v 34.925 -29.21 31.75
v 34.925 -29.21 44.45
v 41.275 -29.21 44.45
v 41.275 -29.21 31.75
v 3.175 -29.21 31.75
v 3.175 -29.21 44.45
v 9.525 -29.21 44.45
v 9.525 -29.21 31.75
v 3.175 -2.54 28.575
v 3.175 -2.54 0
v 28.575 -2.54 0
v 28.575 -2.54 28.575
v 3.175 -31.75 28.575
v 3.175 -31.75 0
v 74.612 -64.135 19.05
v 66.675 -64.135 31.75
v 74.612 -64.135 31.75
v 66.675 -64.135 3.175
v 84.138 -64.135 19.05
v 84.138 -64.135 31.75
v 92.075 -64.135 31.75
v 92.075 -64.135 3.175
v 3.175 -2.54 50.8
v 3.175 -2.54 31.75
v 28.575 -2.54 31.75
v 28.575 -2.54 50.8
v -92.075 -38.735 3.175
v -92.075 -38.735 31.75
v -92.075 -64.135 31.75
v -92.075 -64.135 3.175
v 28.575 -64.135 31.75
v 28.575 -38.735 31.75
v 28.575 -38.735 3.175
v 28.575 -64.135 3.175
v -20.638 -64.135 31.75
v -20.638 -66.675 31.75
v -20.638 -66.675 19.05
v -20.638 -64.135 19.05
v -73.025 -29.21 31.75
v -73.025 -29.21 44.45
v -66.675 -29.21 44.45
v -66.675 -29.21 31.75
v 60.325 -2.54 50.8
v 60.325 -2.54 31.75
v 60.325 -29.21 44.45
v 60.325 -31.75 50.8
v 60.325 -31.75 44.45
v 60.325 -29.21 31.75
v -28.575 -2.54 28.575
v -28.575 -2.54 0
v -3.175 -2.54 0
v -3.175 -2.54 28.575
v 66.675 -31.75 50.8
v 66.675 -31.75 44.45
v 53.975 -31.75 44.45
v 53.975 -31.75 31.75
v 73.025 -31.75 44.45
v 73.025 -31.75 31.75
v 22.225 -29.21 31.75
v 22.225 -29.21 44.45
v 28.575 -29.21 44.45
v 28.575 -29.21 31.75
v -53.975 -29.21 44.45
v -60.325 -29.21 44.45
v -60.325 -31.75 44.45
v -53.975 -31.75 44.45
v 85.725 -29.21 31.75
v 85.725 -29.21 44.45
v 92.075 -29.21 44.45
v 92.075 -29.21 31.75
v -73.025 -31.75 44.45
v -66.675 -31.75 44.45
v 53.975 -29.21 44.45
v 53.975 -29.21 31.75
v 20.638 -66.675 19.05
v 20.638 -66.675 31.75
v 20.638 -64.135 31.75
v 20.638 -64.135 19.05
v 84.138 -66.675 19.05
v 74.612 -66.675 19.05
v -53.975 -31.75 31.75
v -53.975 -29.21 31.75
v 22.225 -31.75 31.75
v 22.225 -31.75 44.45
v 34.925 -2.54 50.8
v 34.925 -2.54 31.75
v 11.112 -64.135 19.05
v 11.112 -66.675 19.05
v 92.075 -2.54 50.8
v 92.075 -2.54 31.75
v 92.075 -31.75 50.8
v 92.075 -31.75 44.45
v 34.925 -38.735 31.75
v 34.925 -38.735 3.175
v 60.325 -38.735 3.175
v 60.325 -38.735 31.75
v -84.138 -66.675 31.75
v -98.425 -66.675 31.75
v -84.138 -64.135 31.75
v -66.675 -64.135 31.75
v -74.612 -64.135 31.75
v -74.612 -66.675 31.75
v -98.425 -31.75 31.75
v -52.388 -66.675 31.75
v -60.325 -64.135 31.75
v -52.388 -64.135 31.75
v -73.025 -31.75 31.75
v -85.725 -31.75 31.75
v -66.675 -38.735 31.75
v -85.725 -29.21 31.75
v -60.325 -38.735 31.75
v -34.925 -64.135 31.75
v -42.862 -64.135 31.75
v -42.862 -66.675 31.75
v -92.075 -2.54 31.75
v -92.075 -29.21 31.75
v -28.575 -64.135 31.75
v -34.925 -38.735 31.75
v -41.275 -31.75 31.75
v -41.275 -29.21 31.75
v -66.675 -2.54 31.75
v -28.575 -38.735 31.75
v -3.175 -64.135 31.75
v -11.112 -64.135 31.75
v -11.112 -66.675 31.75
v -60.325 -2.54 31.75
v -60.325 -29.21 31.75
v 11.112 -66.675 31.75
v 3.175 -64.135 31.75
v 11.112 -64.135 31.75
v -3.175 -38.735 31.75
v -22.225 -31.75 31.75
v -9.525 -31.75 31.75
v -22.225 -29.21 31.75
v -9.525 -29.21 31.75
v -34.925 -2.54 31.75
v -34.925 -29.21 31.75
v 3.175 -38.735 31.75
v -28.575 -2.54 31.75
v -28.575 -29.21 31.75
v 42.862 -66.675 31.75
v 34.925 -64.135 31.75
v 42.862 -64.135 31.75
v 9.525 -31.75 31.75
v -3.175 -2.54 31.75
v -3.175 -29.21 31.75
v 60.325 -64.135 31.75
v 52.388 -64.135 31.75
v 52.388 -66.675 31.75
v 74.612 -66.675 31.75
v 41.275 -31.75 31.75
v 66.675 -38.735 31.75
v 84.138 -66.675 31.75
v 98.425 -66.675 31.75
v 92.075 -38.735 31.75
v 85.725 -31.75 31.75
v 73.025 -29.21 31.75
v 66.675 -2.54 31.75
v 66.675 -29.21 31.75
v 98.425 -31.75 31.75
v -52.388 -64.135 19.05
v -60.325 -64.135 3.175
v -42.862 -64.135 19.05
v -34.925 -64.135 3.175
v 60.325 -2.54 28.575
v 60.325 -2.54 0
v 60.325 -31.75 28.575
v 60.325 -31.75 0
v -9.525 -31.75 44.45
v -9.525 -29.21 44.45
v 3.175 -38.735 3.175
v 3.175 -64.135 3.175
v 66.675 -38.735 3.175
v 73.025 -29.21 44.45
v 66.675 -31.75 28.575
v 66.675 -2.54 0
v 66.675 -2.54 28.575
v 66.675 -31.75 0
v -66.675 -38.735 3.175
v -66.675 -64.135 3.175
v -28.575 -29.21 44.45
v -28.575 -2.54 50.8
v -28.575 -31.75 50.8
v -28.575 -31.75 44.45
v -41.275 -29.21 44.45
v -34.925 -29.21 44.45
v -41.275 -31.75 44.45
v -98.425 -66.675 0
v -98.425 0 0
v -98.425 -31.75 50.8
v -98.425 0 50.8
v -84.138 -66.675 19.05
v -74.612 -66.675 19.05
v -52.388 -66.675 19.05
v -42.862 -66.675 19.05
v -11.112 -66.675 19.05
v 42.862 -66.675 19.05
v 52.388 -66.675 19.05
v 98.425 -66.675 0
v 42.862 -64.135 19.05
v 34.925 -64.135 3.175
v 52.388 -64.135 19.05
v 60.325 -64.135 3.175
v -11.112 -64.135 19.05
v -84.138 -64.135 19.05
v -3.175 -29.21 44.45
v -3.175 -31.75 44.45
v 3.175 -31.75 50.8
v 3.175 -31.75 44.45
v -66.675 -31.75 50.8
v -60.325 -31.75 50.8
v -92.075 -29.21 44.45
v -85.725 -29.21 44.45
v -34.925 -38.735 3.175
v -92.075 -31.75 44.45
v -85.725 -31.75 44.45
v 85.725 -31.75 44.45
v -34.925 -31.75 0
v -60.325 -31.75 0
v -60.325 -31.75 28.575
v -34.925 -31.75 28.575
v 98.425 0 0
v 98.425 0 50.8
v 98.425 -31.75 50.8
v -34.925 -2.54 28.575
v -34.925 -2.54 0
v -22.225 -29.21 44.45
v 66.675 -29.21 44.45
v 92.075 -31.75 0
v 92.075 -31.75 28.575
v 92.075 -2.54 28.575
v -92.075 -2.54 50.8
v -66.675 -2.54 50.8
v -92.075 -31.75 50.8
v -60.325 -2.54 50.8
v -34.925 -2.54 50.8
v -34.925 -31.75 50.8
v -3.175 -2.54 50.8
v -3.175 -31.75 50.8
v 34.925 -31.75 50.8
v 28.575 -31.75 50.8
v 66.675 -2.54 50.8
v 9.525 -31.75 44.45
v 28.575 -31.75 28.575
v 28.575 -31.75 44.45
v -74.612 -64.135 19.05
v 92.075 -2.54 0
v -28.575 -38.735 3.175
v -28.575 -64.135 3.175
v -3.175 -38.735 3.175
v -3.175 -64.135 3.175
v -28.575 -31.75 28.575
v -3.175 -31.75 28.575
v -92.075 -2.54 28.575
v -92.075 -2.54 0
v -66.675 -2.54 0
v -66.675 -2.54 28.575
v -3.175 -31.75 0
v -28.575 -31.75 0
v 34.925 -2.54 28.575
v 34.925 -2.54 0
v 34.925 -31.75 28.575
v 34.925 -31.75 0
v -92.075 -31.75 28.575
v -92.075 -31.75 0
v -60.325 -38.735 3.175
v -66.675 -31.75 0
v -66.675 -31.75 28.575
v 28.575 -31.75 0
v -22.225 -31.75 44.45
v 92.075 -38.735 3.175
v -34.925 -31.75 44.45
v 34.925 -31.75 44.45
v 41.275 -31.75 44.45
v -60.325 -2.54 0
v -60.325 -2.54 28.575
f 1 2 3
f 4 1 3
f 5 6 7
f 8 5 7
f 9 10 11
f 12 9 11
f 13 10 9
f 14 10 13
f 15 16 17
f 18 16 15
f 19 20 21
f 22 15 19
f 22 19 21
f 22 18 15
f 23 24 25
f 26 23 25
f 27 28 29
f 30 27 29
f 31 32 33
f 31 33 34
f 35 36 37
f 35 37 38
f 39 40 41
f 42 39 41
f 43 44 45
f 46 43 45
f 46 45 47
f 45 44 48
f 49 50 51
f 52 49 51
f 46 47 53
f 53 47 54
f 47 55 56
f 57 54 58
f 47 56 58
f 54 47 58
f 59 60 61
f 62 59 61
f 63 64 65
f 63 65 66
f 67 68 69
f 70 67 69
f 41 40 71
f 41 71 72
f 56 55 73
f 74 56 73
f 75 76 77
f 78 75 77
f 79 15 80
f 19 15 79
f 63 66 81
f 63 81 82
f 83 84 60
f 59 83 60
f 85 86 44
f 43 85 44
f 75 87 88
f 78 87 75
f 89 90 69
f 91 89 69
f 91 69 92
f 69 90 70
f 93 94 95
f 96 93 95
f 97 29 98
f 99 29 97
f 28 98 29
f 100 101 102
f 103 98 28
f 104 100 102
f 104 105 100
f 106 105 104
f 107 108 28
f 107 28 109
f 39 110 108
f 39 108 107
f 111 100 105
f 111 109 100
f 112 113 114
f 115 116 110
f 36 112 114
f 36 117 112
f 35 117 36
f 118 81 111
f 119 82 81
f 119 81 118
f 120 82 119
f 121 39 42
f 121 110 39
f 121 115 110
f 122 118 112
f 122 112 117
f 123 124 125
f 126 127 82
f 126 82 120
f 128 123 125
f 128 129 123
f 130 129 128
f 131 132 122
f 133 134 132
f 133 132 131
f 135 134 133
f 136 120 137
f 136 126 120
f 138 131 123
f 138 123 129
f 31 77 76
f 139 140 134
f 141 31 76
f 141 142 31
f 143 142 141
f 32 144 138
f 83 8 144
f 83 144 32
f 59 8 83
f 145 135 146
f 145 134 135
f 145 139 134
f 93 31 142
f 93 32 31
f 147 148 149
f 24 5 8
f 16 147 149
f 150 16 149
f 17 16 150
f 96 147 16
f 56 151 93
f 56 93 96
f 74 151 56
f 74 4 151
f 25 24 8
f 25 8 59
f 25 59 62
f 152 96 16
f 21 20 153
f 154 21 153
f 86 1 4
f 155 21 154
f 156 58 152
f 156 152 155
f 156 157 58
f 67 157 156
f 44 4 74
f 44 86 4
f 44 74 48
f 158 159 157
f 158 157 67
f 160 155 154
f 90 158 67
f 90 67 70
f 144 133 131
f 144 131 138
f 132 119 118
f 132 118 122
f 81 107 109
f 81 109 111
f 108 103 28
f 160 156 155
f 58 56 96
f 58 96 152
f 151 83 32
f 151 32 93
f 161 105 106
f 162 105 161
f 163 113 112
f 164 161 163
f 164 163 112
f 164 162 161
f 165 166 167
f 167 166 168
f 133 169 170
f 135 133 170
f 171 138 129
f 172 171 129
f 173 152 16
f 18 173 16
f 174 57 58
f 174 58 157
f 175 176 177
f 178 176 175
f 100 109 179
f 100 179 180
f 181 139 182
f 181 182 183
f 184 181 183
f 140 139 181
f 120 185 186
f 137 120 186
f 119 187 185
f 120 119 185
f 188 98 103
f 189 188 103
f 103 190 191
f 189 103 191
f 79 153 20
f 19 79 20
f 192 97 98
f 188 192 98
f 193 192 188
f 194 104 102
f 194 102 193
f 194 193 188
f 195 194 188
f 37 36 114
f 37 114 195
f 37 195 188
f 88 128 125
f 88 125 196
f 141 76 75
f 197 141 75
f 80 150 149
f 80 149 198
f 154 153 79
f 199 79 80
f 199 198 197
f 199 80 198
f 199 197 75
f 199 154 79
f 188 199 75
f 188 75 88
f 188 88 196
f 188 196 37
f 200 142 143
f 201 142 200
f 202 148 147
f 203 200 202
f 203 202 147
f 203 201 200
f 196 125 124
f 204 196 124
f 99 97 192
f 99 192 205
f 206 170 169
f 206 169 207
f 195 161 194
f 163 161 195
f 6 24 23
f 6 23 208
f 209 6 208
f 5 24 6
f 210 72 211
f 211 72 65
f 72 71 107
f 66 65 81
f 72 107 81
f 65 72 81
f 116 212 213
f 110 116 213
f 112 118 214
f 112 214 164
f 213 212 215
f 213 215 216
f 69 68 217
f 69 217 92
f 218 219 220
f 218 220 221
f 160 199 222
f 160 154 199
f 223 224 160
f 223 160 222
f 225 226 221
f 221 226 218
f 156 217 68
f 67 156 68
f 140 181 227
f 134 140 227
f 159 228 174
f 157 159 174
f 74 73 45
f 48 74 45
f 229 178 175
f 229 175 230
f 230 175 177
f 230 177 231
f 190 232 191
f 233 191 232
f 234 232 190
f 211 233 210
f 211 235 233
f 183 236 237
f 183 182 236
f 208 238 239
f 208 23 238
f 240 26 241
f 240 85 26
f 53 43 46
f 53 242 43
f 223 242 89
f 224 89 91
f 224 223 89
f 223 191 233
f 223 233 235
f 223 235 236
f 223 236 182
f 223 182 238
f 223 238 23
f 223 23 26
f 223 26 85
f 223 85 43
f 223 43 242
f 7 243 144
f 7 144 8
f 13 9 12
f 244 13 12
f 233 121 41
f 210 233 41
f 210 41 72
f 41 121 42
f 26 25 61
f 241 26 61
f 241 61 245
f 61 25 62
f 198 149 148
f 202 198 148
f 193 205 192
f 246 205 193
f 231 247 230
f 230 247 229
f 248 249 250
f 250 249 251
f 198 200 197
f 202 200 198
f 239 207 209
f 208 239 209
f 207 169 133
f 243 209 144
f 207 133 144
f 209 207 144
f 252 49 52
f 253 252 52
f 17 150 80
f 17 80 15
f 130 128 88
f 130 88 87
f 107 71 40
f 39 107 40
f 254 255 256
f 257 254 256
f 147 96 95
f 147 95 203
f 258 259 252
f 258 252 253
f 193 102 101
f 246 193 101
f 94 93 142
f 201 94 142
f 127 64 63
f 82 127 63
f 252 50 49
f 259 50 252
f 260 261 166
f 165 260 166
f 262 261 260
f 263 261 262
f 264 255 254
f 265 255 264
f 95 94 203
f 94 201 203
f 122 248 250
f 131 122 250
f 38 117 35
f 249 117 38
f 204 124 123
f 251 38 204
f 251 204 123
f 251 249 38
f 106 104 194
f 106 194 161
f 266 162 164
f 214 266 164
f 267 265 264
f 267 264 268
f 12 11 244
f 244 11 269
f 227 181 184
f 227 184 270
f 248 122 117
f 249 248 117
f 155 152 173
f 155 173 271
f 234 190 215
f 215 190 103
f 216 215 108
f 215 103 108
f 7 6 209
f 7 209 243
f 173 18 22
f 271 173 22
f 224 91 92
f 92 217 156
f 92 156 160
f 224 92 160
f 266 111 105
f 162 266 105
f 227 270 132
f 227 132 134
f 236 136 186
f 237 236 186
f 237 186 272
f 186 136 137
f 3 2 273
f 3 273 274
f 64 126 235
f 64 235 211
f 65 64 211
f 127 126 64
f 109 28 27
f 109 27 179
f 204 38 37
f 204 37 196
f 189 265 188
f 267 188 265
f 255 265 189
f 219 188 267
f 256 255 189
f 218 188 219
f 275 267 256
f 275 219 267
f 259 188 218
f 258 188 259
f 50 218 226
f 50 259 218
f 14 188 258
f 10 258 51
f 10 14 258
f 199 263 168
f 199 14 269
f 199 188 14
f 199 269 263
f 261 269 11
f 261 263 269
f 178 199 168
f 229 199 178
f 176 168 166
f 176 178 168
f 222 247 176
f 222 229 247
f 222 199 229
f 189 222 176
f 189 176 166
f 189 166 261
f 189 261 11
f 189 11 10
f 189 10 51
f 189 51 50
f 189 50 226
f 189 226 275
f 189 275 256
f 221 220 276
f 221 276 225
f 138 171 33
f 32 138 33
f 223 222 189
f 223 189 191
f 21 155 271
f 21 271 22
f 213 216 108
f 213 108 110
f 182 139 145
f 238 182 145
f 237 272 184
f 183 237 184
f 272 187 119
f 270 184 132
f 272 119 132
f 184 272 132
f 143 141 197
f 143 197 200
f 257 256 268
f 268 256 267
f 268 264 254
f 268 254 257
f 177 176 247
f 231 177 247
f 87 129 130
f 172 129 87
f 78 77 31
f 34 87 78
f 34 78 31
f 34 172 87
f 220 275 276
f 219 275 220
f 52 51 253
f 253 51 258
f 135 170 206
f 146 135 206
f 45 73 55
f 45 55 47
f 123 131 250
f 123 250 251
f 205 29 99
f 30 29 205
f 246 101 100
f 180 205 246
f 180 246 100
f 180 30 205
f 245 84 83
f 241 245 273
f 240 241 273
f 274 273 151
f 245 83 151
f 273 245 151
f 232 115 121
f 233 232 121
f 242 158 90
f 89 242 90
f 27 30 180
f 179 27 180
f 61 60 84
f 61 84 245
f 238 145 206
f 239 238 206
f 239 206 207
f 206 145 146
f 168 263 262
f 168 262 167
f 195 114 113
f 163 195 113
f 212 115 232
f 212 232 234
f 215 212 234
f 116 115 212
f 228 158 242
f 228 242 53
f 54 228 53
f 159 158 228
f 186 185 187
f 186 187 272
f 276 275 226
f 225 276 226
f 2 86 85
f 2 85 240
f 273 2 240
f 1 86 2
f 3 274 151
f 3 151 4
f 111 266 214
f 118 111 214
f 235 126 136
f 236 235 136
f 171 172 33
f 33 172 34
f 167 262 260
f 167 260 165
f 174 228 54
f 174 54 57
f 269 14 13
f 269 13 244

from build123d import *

# Parameters (mm, degrees)
F1_DEPTH  = 98.425
F2_W      = 25.4
F2_H      = 25.4
F2_H_2    = 29.21
F3_DEPTH  = 50.801
F4_W      = 25.4
F4_H      = 29.21
F5_DEPTH  = 3.175
F6_W      = 6.35
F6_H      = 2.54
F7_DEPTH  = 12.7
F8_W      = 9.525
F8_H      = 2.54
F9_DEPTH  = 12.7
F10_W     = 190.5
F10_H     = 27.94
F11_DEPTH = 3.175


with BuildPart() as f1:
    # F0 (on Right) → F1 (new body, symmetric)
    with BuildSketch(Plane.YZ):
        Polygon((-66.675, 0), (0, 0), (0, 50.8), (-31.75, 50.8), (-31.75, 31.75), (-66.675, 31.75), align=None)
    extrude(amount=F1_DEPTH, both=True)

    # F2 (on face) → F3 (cut, through all)
    with BuildSketch(Plane(origin=(0, 0, 0), x_dir=(1, 0, 0), z_dir=(0, 0, -1))):
        with Locations((-15.875, 51.435)):
            Rectangle(F2_W, F2_H)
        with Locations((-15.875, 17.145)):
            Rectangle(F2_W, F2_H_2)
        with Locations((-47.625, 17.145)):
            Rectangle(F2_W, F2_H_2)
        with Locations((-47.625, 51.435)):
            Rectangle(F2_W, F2_H)
        with Locations((-79.375, 17.145)):
            Rectangle(F2_W, F2_H_2)
        with Locations((-79.375, 51.435)):
            Rectangle(F2_W, F2_H)
        with Locations((47.625, 17.145)):
            Rectangle(F2_W, F2_H_2)
        with Locations((15.875, 51.435)):
            Rectangle(F2_W, F2_H)
        with Locations((79.375, 17.145)):
            Rectangle(F2_W, F2_H_2)
        with Locations((47.625, 51.435)):
            Rectangle(F2_W, F2_H)
        with Locations((79.375, 51.435)):
            Rectangle(F2_W, F2_H)
        with Locations((15.875, 17.145)):
            Rectangle(F2_W, F2_H_2)
    extrude(amount=-F3_DEPTH, mode=Mode.SUBTRACT)

    # F4 (on face) → F5 (join)
    with BuildSketch(Plane.XY.offset(31.75)):
        with Locations((15.875, -17.145)):
            Rectangle(F4_W, F4_H)
        with Locations((47.625, -17.145)):
            Rectangle(F4_W, F4_H)
        with Locations((79.375, -17.145)):
            Rectangle(F4_W, F4_H)
        with Locations((-15.875, -17.145)):
            Rectangle(F4_W, F4_H)
        with Locations((-79.375, -17.145)):
            Rectangle(F4_W, F4_H)
        with Locations((-47.625, -17.145)):
            Rectangle(F4_W, F4_H)
    extrude(amount=-F5_DEPTH)

    # F6 (on face) → F7 (join)
    with BuildSketch(Plane.XY.offset(31.75)):
        with Locations((-88.9, -30.48)):
            Rectangle(F6_W, F6_H)
        with Locations((-69.85, -30.48)):
            Rectangle(F6_W, F6_H)
        with Locations((-38.1, -30.48)):
            Rectangle(F6_W, F6_H)
        with Locations((-57.15, -30.48)):
            Rectangle(F6_W, F6_H)
        with Locations((-6.35, -30.48)):
            Rectangle(F6_W, F6_H)
        with Locations((-25.4, -30.48)):
            Rectangle(F6_W, F6_H)
        with Locations((25.4, -30.48)):
            Rectangle(F6_W, F6_H)
        with Locations((6.35, -30.48)):
            Rectangle(F6_W, F6_H)
        with Locations((57.15, -30.48)):
            Rectangle(F6_W, F6_H)
        with Locations((38.1, -30.48)):
            Rectangle(F6_W, F6_H)
        with Locations((88.9, -30.48)):
            Rectangle(F6_W, F6_H)
        with Locations((69.85, -30.48)):
            Rectangle(F6_W, F6_H)
    extrude(amount=F7_DEPTH)

    # F8 (on face) → F9 (cut)
    with BuildSketch(Plane.XY.offset(31.75)):
        with Locations((-79.375, -65.405)):
            Rectangle(F8_W, F8_H)
        with Locations((-47.625, -65.405)):
            Rectangle(F8_W, F8_H)
        with Locations((-15.875, -65.405)):
            Rectangle(F8_W, F8_H)
        with Locations((15.875, -65.405)):
            Rectangle(F8_W, F8_H)
        with Locations((47.625, -65.405)):
            Rectangle(F8_W, F8_H)
        with Locations((79.375, -65.405)):
            Rectangle(F8_W, F8_H)
    extrude(amount=-F9_DEPTH, mode=Mode.SUBTRACT)

    # F10 (on face) → F11 (join)
    with BuildSketch(Plane(origin=(0, 0, 0), x_dir=(1, 0, 0), z_dir=(0, 0, -1))):
        with Locations((-3.175, 52.705)):
            Rectangle(F10_W, F10_H)
    extrude(amount=-F11_DEPTH)


solid = f1.part
